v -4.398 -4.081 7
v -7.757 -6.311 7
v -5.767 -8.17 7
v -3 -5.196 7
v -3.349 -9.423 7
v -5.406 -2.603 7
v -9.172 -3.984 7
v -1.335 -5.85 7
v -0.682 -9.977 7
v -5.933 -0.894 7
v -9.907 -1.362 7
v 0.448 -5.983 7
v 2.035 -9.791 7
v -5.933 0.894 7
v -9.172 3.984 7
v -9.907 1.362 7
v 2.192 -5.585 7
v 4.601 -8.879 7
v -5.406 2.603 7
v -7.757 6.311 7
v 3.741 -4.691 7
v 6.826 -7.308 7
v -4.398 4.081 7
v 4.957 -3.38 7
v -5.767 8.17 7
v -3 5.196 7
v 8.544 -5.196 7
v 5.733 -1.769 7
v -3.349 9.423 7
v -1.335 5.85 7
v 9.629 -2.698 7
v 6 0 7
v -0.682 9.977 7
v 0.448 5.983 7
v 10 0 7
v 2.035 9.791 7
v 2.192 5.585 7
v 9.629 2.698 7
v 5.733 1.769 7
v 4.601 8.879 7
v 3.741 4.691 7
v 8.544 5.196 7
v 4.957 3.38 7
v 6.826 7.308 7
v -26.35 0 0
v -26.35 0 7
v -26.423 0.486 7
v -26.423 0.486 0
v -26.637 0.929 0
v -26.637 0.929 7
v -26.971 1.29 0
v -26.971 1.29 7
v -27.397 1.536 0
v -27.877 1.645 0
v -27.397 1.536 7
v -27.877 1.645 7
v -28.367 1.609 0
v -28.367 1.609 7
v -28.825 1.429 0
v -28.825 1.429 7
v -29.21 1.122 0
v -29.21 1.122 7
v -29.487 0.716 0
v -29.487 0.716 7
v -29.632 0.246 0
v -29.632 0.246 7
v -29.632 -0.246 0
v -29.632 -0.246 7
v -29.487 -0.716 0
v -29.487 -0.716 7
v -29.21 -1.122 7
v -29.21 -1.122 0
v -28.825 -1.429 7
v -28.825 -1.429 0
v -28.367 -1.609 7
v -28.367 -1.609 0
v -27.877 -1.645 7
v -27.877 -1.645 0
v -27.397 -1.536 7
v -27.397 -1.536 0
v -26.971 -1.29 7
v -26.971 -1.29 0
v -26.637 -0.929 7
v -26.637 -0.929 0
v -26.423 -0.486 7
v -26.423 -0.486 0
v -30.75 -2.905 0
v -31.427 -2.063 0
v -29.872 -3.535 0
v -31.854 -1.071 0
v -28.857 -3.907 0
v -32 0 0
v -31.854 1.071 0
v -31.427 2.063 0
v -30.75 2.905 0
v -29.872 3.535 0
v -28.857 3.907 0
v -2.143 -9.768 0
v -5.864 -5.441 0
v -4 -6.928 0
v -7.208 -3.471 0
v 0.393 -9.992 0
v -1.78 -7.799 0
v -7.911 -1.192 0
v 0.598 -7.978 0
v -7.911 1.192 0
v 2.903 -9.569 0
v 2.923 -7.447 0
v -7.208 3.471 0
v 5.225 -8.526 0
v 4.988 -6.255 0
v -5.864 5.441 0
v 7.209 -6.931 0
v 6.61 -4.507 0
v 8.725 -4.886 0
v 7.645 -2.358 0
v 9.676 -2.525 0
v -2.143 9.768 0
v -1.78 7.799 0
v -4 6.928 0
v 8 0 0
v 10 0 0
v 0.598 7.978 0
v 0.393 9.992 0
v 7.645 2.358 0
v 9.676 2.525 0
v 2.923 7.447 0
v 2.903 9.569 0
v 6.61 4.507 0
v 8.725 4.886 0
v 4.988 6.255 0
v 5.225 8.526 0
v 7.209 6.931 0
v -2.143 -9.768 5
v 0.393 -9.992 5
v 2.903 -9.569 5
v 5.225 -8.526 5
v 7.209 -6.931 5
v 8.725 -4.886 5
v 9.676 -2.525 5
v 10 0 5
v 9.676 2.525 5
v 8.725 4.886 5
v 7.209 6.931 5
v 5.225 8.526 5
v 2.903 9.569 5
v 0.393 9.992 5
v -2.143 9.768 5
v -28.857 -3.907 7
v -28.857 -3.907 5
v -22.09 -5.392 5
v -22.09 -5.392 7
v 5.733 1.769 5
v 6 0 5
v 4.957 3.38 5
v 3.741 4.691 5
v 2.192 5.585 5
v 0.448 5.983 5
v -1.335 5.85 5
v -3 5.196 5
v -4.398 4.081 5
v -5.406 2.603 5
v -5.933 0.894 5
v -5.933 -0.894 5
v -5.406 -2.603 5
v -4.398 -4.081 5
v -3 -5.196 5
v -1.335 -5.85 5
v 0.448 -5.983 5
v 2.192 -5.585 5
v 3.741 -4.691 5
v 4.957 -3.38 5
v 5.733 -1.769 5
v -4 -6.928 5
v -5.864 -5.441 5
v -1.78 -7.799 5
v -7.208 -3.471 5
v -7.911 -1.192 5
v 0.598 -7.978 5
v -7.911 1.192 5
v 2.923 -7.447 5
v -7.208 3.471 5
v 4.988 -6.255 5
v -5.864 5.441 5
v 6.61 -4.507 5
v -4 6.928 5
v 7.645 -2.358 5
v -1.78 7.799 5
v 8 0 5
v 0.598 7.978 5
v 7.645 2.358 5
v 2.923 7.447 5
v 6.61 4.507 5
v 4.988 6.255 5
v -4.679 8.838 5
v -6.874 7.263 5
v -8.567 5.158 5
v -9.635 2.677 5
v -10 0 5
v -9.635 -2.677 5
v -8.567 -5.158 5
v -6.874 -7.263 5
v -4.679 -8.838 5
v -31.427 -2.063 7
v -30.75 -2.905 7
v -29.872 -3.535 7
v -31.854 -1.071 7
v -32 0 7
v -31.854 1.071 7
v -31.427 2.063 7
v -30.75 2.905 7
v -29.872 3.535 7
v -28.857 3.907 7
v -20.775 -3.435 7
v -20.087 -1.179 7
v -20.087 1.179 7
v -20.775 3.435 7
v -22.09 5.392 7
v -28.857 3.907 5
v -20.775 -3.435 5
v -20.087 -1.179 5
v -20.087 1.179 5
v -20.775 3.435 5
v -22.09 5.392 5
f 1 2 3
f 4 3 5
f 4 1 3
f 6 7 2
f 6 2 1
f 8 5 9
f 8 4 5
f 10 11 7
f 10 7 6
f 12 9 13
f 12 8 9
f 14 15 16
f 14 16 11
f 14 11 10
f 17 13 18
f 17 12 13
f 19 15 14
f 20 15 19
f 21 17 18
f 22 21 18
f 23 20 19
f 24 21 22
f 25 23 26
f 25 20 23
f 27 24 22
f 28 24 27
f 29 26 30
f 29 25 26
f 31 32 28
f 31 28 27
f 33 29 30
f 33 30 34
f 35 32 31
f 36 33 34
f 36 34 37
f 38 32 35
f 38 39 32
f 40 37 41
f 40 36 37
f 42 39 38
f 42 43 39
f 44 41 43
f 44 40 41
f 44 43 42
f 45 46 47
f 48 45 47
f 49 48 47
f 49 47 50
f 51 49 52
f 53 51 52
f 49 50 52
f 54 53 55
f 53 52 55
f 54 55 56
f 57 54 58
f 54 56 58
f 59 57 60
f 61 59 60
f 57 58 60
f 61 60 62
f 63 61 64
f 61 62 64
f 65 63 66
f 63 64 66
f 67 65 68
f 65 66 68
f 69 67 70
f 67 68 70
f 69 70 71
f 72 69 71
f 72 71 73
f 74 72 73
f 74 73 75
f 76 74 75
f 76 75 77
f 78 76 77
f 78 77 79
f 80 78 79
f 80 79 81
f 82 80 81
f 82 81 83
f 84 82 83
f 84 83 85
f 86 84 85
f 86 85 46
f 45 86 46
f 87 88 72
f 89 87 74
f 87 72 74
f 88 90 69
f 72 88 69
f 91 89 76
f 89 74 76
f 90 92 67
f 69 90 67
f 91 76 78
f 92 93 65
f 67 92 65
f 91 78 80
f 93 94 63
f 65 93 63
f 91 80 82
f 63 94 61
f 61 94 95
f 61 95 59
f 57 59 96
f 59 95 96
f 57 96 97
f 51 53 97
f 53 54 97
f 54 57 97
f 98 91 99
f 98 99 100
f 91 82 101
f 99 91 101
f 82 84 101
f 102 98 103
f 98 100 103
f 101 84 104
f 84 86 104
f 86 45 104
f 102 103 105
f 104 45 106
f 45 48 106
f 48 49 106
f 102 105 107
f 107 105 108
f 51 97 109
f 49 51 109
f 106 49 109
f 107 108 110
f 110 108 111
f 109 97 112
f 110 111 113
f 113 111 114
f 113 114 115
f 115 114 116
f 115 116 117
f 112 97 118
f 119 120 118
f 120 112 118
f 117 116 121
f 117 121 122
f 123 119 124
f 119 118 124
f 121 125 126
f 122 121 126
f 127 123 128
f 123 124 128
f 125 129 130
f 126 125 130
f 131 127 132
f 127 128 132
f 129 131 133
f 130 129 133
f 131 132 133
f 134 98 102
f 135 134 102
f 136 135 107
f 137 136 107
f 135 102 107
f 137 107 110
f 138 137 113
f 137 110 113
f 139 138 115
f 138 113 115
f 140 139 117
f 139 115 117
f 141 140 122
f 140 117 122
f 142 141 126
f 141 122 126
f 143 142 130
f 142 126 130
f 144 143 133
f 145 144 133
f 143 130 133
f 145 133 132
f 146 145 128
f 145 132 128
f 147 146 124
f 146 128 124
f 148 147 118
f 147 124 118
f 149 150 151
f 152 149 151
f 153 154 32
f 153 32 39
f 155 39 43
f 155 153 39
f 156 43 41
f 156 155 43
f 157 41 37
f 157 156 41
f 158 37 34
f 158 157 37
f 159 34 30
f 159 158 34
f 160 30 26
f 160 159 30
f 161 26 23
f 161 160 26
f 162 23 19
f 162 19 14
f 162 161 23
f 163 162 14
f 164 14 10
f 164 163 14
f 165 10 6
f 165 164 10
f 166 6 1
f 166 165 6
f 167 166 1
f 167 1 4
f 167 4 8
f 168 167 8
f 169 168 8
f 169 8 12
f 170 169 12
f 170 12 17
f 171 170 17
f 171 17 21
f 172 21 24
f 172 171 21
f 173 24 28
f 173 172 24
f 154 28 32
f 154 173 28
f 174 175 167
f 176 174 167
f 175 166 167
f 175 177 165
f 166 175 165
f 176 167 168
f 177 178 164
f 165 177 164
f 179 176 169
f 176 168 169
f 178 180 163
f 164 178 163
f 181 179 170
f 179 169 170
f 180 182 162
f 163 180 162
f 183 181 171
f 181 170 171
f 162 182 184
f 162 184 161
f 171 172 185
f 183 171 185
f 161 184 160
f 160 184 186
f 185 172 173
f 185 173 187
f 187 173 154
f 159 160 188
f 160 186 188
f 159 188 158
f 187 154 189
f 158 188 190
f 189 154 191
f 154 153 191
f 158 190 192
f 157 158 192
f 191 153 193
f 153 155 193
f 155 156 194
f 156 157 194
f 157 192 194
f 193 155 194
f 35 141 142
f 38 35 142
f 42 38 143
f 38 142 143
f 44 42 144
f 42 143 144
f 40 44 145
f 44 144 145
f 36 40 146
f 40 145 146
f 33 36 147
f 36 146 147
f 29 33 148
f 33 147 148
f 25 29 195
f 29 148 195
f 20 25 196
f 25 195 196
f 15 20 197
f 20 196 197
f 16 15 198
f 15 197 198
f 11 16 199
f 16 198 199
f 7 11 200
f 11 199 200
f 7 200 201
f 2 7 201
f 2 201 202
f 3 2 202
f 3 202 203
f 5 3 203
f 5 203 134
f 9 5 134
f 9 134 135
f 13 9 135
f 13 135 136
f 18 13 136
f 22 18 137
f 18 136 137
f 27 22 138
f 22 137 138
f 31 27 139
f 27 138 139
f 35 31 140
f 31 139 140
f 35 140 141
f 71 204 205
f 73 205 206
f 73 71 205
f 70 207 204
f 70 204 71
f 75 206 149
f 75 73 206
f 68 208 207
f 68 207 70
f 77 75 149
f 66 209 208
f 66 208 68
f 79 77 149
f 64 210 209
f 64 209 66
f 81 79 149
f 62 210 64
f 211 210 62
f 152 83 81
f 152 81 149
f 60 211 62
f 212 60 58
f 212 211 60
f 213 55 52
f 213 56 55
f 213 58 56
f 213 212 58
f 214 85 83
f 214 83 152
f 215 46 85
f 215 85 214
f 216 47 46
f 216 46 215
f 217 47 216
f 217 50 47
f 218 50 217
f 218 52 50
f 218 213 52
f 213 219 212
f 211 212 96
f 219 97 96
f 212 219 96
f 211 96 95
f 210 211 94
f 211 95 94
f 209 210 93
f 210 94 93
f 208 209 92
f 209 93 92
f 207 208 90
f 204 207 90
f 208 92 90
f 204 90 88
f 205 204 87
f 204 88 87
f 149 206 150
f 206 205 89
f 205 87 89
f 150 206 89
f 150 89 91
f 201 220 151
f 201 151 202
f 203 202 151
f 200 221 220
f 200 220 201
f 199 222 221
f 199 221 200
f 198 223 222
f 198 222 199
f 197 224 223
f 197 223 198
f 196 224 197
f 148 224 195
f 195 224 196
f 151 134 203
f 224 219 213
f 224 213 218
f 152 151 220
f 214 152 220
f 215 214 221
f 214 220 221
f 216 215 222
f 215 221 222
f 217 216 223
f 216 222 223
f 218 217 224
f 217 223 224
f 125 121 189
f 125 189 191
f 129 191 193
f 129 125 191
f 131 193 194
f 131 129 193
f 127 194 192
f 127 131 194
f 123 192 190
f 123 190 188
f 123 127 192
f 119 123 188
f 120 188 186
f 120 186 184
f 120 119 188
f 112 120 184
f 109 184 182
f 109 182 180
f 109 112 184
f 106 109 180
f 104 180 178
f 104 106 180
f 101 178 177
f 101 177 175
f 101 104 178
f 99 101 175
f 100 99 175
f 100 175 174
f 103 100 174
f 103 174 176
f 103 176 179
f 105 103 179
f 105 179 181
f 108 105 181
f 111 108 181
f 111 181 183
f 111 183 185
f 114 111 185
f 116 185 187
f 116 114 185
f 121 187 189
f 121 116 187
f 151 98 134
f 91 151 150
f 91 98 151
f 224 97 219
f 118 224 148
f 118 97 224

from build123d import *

# Parameters (mm, degrees)
SKETCH_R      = 8
PAD_DEPTH     = 5
SKETCH001_R   = 10
SKETCH001_R_2 = 6
PAD001_DEPTH  = 2
PAD002_DEPTH  = 2
SKETCH003_R   = 1.65
POCKET_DEPTH  = 7.001


with BuildPart() as part:
    # Sketch → Pad (new body)
    with BuildSketch(Plane.XY):
        with BuildLine():
            ThreePointArc((-2.142857, -9.76771), (10, 0), (-2.142857, 9.76771))
            Line((-28.857143, 3.907084), (-2.142857, 9.76771))
            ThreePointArc((-28.857143, 3.907084), (-32, 0), (-28.857143, -3.907084))
            Line((-2.142857, -9.76771), (-28.857143, -3.907084))
        make_face()
        Circle(SKETCH_R, mode=Mode.SUBTRACT)
    extrude(amount=PAD_DEPTH)

    # Sketch001 (on Face7 of Pad) → Pad001 (join)
    with BuildSketch(Plane.XY.offset(5)):
        Circle(SKETCH001_R)
        Circle(SKETCH001_R_2, mode=Mode.SUBTRACT)
    extrude(amount=PAD001_DEPTH)

    # Sketch002 (on Face7 of Pad001) → Pad002 (join)
    with BuildSketch(Plane.XY.offset(5)):
        with BuildLine():
            ThreePointArc((-28.857143, 3.907084), (-32, 0), (-28.857143, -3.907084))
            Line((-28.857143, -3.907084), (-22.089875, -5.391699))
            ThreePointArc((-22.089875, -5.391699), (-20, 0), (-22.089875, 5.391699))
            Line((-28.857143, 3.907084), (-22.089875, 5.391699))
        make_face()
    extrude(amount=PAD002_DEPTH)

    # Sketch003 (on Face14 of Pad002) → Pocket (cut, through all)
    with BuildSketch(Plane.XY.offset(7)):
        with Locations((-28, 0)):
            Circle(SKETCH003_R)
    extrude(amount=-POCKET_DEPTH, mode=Mode.SUBTRACT)


solid = part.part
